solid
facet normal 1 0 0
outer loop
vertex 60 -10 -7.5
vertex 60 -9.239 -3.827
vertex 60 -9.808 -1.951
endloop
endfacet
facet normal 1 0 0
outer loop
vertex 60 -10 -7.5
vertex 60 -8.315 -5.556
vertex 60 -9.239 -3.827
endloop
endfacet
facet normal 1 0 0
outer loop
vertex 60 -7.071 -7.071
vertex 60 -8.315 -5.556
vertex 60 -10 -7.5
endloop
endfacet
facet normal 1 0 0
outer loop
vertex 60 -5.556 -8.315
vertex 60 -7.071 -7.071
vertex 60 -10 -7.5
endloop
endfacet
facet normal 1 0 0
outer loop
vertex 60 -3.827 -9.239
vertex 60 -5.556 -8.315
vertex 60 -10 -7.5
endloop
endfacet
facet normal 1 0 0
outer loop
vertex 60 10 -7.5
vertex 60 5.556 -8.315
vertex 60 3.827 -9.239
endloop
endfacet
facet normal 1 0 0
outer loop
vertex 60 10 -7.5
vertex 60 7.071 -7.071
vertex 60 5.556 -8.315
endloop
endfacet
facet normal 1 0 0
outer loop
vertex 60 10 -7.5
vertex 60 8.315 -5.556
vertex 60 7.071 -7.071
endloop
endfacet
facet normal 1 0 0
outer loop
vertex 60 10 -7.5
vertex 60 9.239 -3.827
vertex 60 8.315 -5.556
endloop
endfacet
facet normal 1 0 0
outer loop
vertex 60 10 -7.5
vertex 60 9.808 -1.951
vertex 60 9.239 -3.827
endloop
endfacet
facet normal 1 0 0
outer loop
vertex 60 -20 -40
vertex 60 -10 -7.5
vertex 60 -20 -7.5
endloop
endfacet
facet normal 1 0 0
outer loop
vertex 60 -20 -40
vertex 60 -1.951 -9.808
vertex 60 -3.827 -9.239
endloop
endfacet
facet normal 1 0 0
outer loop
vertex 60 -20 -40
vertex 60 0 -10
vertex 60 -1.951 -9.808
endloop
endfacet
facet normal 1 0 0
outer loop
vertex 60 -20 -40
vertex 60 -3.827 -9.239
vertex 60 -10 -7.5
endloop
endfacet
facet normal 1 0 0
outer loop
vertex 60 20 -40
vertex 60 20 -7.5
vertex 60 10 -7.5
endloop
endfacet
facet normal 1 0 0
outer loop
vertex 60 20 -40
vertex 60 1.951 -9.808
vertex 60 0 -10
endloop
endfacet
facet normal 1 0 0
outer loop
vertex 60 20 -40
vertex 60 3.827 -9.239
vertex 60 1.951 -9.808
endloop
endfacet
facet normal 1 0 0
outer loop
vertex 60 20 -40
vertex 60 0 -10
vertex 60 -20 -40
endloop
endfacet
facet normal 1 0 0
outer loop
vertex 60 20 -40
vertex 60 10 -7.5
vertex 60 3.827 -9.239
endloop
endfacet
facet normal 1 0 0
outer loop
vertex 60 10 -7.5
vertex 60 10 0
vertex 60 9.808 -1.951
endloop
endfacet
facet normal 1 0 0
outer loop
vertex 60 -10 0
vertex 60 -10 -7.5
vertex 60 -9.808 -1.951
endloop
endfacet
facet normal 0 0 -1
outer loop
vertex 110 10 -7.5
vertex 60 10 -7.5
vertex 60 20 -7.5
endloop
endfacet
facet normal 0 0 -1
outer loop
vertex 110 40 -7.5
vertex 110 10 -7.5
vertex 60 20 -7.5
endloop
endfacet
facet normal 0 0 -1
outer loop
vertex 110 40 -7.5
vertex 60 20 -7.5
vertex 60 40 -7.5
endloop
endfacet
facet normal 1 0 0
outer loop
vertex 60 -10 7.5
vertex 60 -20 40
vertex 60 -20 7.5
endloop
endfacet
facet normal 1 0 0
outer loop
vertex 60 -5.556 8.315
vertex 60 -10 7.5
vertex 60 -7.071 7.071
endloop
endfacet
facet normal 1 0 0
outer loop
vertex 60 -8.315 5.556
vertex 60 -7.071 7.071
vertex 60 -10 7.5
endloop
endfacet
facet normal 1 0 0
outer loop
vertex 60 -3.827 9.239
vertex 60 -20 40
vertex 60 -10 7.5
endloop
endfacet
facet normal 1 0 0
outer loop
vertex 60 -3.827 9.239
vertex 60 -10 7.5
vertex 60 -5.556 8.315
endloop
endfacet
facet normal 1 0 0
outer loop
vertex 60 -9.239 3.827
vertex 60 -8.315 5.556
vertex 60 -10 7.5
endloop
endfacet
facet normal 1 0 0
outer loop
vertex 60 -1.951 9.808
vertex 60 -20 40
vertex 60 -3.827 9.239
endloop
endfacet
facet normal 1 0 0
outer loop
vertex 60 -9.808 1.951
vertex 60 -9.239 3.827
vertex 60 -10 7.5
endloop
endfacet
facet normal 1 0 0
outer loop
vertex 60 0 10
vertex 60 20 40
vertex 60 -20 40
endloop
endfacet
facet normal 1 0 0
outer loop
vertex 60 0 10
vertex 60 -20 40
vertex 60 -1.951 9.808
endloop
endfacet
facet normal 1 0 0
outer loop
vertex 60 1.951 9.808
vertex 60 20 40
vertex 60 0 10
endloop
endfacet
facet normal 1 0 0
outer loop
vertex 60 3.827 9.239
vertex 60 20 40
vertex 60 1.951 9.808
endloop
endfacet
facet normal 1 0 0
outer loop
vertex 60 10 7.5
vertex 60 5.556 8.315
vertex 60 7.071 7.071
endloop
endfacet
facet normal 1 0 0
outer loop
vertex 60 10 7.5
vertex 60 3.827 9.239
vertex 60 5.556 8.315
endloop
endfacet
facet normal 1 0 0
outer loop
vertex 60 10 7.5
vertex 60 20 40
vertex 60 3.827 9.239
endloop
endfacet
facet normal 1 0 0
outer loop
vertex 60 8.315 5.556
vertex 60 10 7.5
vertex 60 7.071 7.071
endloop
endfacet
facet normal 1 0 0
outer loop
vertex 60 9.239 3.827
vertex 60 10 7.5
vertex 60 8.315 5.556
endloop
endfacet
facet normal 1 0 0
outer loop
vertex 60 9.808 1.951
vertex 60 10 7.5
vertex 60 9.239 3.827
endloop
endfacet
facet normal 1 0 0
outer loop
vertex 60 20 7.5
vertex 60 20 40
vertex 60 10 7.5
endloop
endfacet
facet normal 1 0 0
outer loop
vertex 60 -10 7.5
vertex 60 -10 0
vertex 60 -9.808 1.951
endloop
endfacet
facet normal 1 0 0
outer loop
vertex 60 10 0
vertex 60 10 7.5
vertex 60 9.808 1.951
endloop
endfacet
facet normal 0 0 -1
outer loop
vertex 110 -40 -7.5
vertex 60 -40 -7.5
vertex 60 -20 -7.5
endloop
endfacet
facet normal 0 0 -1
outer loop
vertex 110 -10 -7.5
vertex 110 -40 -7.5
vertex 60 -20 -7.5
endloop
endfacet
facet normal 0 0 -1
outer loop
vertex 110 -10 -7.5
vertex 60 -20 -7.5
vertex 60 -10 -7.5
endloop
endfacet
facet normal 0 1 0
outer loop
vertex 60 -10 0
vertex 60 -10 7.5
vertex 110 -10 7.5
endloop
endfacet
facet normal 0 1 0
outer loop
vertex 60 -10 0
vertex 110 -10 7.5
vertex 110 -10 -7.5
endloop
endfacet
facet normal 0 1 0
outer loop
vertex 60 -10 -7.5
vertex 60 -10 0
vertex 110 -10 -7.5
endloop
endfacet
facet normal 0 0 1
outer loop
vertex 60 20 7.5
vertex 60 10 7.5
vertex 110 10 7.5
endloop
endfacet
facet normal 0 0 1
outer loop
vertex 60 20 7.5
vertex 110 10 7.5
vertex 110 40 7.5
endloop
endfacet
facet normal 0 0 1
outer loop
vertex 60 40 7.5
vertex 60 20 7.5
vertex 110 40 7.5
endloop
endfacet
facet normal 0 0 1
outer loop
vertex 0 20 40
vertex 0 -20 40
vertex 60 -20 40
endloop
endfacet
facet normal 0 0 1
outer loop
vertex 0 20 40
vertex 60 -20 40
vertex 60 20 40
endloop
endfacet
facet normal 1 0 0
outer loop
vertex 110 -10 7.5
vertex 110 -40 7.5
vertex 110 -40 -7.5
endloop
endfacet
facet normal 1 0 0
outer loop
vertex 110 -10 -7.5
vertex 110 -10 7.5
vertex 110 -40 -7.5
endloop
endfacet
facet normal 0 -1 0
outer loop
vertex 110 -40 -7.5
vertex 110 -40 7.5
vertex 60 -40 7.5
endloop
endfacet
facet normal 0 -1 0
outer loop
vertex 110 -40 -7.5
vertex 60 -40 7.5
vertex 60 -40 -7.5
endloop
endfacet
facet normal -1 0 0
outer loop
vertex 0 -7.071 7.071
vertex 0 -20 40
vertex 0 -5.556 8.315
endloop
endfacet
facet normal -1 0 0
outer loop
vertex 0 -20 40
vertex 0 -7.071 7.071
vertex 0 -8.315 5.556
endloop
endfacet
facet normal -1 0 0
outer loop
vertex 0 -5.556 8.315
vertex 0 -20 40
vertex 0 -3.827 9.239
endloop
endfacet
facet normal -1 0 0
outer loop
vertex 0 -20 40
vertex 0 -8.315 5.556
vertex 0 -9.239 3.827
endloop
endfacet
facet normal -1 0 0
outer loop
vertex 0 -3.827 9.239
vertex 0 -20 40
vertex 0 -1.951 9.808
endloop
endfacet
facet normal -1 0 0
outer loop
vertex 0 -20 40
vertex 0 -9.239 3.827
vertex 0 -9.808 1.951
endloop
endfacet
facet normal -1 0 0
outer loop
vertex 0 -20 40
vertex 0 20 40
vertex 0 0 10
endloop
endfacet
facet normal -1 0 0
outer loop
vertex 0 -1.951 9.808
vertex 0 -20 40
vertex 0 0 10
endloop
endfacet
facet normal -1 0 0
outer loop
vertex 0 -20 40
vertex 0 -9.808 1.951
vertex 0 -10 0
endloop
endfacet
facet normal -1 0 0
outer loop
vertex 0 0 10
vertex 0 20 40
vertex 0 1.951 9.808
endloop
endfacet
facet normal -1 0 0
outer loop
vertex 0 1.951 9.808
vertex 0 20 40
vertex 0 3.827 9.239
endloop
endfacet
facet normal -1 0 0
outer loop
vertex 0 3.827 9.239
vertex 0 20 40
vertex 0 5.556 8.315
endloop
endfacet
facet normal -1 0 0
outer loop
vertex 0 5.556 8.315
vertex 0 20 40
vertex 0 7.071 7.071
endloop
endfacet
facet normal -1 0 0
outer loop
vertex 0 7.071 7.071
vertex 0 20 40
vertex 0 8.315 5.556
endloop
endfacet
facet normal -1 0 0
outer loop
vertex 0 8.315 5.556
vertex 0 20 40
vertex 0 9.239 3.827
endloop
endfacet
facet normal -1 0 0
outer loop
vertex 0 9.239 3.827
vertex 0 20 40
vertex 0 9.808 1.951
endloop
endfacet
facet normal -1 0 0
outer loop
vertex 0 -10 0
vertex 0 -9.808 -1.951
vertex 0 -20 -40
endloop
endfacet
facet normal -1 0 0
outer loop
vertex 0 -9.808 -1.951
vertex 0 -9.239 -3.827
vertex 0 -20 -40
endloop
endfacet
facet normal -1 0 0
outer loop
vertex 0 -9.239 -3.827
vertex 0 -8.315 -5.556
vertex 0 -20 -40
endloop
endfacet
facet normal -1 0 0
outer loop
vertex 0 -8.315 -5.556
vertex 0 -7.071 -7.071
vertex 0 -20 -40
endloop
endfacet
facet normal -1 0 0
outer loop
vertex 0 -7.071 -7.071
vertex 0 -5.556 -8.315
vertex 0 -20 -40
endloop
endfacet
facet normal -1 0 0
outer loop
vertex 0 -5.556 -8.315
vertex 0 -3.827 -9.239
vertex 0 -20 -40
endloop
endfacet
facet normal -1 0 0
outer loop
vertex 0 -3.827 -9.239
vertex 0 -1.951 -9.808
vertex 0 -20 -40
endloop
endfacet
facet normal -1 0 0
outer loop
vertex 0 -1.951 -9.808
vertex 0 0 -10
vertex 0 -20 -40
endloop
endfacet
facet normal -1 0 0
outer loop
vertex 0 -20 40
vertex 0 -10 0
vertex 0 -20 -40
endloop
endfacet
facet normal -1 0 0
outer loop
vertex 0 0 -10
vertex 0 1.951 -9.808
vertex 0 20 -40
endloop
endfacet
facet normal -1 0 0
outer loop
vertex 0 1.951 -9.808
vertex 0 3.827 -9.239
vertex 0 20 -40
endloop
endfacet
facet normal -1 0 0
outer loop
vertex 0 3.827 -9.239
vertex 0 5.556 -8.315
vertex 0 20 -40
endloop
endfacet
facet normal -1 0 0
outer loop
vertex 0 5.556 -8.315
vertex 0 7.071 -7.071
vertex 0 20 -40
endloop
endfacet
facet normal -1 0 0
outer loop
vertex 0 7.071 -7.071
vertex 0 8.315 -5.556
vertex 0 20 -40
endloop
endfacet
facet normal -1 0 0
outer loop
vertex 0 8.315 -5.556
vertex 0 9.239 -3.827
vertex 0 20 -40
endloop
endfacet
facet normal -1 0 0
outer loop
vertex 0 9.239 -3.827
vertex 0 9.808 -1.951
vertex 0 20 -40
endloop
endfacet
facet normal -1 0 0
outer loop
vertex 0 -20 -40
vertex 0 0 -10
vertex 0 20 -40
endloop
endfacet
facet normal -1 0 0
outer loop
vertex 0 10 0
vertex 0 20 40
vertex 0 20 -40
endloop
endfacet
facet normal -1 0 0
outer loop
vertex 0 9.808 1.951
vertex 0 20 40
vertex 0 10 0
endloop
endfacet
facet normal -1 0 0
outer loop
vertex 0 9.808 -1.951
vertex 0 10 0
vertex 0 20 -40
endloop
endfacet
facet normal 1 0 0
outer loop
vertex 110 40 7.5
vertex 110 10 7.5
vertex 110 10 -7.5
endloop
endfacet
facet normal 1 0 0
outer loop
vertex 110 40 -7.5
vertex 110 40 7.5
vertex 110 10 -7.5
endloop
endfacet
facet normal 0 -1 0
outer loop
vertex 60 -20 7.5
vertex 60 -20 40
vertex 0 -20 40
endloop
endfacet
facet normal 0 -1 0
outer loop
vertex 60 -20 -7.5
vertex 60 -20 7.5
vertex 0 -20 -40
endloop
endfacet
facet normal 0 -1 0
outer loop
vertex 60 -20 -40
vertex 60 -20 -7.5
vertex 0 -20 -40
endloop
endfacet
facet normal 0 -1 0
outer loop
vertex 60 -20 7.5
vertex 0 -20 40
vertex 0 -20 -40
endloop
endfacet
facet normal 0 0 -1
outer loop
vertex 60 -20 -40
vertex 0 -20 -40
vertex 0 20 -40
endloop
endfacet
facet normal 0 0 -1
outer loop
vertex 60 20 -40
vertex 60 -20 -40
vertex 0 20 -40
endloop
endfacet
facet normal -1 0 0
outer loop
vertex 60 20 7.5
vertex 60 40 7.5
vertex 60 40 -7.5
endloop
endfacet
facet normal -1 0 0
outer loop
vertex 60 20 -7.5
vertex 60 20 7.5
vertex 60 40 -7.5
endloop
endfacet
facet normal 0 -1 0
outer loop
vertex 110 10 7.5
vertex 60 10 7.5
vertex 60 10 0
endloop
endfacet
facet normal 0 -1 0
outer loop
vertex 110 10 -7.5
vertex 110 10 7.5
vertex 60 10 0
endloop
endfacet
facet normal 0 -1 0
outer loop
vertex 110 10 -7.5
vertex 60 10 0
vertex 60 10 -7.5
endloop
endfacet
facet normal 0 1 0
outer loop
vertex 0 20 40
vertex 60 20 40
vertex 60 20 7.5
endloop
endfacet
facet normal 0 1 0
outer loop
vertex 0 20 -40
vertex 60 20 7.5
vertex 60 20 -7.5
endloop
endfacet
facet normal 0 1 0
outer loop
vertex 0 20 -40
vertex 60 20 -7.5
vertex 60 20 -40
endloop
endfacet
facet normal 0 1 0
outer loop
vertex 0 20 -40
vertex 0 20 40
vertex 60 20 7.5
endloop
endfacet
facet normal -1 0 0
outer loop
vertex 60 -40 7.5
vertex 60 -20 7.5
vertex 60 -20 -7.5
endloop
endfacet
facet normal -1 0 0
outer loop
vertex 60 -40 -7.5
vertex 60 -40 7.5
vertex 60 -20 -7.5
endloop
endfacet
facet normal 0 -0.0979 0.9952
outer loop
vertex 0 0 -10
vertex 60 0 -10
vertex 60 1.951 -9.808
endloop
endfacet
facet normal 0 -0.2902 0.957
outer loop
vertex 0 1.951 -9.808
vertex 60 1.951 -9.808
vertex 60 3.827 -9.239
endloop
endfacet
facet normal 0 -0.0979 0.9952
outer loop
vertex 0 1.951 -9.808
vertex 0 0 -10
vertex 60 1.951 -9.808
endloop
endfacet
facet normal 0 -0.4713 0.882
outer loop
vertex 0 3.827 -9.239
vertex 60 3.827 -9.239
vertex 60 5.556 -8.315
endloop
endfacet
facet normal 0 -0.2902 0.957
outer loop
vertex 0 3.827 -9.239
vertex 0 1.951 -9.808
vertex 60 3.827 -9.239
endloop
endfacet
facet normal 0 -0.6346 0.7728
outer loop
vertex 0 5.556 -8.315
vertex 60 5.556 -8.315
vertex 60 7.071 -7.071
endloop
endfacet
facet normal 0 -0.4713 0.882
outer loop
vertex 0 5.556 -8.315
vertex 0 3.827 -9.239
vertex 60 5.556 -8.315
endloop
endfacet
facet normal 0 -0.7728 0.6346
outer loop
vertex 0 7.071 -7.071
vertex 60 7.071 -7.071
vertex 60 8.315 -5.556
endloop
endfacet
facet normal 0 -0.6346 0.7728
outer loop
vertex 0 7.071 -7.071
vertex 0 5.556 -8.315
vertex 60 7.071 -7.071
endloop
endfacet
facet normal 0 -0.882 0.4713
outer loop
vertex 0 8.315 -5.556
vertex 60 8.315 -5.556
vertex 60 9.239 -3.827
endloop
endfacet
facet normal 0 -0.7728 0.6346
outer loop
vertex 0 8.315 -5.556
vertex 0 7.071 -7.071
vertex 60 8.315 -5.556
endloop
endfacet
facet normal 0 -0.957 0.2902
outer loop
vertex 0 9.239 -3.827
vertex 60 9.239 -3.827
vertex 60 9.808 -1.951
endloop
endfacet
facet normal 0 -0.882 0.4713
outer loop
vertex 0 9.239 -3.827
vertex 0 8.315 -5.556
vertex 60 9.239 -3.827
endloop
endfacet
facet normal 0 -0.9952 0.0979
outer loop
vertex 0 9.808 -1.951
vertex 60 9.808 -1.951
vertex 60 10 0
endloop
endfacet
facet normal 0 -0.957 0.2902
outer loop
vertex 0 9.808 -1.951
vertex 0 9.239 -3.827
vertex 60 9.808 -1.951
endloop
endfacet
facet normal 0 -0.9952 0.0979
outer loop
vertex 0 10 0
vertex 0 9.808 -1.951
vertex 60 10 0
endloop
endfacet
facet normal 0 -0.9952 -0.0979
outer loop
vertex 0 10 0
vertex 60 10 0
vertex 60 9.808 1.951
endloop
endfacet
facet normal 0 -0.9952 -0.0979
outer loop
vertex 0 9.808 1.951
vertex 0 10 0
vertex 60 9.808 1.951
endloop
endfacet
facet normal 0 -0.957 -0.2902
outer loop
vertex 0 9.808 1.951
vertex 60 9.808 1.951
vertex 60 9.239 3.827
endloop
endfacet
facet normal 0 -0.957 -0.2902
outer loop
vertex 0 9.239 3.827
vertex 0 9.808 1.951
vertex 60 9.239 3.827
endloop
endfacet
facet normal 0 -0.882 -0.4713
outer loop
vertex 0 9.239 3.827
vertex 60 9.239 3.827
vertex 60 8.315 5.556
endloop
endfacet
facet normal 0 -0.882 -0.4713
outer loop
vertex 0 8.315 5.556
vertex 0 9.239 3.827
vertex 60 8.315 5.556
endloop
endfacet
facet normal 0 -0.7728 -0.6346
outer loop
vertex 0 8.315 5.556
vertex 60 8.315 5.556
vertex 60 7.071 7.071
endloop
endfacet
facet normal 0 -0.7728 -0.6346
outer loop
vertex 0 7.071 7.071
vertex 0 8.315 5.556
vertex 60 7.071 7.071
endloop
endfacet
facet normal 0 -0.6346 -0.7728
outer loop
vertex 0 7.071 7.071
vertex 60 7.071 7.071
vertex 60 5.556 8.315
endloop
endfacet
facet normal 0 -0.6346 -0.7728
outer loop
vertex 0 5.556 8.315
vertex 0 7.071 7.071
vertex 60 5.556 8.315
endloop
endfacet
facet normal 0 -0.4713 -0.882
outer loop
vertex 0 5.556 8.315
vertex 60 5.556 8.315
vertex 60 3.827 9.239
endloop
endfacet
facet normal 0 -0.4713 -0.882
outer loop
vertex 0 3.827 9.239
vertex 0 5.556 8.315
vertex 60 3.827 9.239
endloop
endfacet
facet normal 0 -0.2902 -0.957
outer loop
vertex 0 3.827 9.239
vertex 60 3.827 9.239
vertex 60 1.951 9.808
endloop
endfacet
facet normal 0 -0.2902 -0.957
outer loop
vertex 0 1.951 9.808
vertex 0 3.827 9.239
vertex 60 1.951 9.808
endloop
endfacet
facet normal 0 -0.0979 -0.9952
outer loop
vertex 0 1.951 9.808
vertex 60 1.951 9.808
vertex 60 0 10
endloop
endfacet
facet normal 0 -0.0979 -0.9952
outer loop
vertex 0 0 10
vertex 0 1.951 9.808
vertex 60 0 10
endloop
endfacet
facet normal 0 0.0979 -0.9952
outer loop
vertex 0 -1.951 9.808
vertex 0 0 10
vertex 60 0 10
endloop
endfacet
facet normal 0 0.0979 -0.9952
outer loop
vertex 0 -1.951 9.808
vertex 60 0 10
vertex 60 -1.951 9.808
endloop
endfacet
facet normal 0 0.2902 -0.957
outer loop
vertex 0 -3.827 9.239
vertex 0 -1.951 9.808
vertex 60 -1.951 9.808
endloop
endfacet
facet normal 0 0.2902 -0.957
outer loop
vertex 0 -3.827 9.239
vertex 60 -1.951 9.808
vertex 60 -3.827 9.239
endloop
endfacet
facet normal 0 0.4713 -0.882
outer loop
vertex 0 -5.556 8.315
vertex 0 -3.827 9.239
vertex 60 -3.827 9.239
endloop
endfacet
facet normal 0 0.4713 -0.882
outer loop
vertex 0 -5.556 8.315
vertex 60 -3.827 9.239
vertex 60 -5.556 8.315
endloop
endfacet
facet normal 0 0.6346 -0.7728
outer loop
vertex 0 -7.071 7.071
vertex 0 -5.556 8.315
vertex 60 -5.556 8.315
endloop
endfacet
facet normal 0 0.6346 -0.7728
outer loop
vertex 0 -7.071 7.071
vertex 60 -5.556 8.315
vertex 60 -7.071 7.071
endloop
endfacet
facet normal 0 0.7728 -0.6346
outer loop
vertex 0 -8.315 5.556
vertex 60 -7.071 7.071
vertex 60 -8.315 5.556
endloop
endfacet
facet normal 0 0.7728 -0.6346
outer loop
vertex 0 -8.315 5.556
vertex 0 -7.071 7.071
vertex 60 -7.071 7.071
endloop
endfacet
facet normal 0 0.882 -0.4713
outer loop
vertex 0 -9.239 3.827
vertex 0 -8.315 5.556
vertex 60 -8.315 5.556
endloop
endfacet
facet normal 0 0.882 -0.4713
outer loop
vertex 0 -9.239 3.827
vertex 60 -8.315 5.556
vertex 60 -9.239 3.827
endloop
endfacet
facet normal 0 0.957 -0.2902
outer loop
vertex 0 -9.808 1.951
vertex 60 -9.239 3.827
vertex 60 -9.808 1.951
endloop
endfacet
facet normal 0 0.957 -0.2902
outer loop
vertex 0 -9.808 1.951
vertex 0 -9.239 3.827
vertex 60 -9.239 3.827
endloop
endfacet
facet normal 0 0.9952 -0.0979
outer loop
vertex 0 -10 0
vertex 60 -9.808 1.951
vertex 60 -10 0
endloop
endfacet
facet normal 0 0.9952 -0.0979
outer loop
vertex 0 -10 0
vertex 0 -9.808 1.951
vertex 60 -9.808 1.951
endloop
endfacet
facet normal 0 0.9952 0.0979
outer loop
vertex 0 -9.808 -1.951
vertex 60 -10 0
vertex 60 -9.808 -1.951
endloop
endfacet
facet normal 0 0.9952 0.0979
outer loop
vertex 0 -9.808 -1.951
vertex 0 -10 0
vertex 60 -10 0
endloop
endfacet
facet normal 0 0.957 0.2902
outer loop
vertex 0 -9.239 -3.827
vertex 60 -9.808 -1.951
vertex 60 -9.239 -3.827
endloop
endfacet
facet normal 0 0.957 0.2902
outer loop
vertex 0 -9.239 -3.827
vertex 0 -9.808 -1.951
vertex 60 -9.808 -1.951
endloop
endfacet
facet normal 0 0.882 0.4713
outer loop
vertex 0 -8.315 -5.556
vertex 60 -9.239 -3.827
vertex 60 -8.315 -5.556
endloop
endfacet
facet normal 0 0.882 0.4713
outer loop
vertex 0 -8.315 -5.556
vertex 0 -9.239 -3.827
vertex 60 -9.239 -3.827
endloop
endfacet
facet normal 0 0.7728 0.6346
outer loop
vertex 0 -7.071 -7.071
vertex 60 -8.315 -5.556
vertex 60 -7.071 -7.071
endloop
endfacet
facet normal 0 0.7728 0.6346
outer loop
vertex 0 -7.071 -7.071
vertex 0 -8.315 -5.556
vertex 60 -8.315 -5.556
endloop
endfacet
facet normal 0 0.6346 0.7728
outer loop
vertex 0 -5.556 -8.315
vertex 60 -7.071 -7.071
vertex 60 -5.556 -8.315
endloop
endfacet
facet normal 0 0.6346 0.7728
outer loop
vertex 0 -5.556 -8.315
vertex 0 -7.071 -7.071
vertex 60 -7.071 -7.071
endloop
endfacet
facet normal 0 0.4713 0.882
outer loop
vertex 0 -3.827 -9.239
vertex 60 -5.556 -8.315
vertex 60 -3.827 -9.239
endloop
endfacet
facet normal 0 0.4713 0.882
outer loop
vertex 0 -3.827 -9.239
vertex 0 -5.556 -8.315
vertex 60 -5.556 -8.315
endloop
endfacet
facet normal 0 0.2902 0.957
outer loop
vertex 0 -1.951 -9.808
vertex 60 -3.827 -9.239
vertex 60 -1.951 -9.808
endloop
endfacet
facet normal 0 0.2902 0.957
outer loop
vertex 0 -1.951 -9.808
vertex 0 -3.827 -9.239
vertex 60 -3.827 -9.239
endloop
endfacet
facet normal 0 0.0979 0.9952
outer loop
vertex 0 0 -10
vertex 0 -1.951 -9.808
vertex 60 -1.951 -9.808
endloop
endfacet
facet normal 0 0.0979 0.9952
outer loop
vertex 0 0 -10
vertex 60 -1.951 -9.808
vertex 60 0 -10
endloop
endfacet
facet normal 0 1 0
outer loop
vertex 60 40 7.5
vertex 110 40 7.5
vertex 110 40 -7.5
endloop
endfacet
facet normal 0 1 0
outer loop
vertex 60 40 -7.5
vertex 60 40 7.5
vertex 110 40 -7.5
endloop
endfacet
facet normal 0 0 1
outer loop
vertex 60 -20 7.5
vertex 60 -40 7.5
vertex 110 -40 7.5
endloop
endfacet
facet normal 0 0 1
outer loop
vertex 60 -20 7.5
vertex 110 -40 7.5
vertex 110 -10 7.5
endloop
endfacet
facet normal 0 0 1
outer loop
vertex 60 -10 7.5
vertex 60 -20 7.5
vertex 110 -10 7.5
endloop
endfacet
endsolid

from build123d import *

# Parameters (mm, degrees)
SKETCH1_W           = 80
SKETCH1_H           = 40
BOSS_EXTRUDE1_DEPTH = 60
SKETCH2_R           = 10
CUT_EXTRUDE1_DEPTH  = 60
SKETCH3_W           = 15
SKETCH3_H           = 30
BOSS_EXTRUDE2_DEPTH = 50


with BuildPart() as part:
    # Sketch1 → Boss-Extrude1 (new body)
    with BuildSketch(Plane(origin=(0, 0, 0), x_dir=(0, 0, -1), z_dir=(1, 0, 0))):
        Rectangle(SKETCH1_W, SKETCH1_H)
    extrude(amount=BOSS_EXTRUDE1_DEPTH)

    # Sketch2 → Cut-Extrude1 (cut)
    with BuildSketch(Plane(origin=(0, 0, 0), x_dir=(0, 0, -1), z_dir=(1, 0, 0))):
        Circle(SKETCH2_R)
    extrude(amount=CUT_EXTRUDE1_DEPTH, mode=Mode.SUBTRACT)

    # Sketch3 → Boss-Extrude2 (add)
    with BuildSketch(Plane(origin=(60, 0, 0), x_dir=(0, 0, -1), z_dir=(1, 0, 0))):
        with Locations((0, 25)):
            Rectangle(SKETCH3_W, SKETCH3_H)
        with Locations((0, -25)):
            Rectangle(SKETCH3_W, SKETCH3_H)
    extrude(amount=BOSS_EXTRUDE2_DEPTH)


solid = part.part
